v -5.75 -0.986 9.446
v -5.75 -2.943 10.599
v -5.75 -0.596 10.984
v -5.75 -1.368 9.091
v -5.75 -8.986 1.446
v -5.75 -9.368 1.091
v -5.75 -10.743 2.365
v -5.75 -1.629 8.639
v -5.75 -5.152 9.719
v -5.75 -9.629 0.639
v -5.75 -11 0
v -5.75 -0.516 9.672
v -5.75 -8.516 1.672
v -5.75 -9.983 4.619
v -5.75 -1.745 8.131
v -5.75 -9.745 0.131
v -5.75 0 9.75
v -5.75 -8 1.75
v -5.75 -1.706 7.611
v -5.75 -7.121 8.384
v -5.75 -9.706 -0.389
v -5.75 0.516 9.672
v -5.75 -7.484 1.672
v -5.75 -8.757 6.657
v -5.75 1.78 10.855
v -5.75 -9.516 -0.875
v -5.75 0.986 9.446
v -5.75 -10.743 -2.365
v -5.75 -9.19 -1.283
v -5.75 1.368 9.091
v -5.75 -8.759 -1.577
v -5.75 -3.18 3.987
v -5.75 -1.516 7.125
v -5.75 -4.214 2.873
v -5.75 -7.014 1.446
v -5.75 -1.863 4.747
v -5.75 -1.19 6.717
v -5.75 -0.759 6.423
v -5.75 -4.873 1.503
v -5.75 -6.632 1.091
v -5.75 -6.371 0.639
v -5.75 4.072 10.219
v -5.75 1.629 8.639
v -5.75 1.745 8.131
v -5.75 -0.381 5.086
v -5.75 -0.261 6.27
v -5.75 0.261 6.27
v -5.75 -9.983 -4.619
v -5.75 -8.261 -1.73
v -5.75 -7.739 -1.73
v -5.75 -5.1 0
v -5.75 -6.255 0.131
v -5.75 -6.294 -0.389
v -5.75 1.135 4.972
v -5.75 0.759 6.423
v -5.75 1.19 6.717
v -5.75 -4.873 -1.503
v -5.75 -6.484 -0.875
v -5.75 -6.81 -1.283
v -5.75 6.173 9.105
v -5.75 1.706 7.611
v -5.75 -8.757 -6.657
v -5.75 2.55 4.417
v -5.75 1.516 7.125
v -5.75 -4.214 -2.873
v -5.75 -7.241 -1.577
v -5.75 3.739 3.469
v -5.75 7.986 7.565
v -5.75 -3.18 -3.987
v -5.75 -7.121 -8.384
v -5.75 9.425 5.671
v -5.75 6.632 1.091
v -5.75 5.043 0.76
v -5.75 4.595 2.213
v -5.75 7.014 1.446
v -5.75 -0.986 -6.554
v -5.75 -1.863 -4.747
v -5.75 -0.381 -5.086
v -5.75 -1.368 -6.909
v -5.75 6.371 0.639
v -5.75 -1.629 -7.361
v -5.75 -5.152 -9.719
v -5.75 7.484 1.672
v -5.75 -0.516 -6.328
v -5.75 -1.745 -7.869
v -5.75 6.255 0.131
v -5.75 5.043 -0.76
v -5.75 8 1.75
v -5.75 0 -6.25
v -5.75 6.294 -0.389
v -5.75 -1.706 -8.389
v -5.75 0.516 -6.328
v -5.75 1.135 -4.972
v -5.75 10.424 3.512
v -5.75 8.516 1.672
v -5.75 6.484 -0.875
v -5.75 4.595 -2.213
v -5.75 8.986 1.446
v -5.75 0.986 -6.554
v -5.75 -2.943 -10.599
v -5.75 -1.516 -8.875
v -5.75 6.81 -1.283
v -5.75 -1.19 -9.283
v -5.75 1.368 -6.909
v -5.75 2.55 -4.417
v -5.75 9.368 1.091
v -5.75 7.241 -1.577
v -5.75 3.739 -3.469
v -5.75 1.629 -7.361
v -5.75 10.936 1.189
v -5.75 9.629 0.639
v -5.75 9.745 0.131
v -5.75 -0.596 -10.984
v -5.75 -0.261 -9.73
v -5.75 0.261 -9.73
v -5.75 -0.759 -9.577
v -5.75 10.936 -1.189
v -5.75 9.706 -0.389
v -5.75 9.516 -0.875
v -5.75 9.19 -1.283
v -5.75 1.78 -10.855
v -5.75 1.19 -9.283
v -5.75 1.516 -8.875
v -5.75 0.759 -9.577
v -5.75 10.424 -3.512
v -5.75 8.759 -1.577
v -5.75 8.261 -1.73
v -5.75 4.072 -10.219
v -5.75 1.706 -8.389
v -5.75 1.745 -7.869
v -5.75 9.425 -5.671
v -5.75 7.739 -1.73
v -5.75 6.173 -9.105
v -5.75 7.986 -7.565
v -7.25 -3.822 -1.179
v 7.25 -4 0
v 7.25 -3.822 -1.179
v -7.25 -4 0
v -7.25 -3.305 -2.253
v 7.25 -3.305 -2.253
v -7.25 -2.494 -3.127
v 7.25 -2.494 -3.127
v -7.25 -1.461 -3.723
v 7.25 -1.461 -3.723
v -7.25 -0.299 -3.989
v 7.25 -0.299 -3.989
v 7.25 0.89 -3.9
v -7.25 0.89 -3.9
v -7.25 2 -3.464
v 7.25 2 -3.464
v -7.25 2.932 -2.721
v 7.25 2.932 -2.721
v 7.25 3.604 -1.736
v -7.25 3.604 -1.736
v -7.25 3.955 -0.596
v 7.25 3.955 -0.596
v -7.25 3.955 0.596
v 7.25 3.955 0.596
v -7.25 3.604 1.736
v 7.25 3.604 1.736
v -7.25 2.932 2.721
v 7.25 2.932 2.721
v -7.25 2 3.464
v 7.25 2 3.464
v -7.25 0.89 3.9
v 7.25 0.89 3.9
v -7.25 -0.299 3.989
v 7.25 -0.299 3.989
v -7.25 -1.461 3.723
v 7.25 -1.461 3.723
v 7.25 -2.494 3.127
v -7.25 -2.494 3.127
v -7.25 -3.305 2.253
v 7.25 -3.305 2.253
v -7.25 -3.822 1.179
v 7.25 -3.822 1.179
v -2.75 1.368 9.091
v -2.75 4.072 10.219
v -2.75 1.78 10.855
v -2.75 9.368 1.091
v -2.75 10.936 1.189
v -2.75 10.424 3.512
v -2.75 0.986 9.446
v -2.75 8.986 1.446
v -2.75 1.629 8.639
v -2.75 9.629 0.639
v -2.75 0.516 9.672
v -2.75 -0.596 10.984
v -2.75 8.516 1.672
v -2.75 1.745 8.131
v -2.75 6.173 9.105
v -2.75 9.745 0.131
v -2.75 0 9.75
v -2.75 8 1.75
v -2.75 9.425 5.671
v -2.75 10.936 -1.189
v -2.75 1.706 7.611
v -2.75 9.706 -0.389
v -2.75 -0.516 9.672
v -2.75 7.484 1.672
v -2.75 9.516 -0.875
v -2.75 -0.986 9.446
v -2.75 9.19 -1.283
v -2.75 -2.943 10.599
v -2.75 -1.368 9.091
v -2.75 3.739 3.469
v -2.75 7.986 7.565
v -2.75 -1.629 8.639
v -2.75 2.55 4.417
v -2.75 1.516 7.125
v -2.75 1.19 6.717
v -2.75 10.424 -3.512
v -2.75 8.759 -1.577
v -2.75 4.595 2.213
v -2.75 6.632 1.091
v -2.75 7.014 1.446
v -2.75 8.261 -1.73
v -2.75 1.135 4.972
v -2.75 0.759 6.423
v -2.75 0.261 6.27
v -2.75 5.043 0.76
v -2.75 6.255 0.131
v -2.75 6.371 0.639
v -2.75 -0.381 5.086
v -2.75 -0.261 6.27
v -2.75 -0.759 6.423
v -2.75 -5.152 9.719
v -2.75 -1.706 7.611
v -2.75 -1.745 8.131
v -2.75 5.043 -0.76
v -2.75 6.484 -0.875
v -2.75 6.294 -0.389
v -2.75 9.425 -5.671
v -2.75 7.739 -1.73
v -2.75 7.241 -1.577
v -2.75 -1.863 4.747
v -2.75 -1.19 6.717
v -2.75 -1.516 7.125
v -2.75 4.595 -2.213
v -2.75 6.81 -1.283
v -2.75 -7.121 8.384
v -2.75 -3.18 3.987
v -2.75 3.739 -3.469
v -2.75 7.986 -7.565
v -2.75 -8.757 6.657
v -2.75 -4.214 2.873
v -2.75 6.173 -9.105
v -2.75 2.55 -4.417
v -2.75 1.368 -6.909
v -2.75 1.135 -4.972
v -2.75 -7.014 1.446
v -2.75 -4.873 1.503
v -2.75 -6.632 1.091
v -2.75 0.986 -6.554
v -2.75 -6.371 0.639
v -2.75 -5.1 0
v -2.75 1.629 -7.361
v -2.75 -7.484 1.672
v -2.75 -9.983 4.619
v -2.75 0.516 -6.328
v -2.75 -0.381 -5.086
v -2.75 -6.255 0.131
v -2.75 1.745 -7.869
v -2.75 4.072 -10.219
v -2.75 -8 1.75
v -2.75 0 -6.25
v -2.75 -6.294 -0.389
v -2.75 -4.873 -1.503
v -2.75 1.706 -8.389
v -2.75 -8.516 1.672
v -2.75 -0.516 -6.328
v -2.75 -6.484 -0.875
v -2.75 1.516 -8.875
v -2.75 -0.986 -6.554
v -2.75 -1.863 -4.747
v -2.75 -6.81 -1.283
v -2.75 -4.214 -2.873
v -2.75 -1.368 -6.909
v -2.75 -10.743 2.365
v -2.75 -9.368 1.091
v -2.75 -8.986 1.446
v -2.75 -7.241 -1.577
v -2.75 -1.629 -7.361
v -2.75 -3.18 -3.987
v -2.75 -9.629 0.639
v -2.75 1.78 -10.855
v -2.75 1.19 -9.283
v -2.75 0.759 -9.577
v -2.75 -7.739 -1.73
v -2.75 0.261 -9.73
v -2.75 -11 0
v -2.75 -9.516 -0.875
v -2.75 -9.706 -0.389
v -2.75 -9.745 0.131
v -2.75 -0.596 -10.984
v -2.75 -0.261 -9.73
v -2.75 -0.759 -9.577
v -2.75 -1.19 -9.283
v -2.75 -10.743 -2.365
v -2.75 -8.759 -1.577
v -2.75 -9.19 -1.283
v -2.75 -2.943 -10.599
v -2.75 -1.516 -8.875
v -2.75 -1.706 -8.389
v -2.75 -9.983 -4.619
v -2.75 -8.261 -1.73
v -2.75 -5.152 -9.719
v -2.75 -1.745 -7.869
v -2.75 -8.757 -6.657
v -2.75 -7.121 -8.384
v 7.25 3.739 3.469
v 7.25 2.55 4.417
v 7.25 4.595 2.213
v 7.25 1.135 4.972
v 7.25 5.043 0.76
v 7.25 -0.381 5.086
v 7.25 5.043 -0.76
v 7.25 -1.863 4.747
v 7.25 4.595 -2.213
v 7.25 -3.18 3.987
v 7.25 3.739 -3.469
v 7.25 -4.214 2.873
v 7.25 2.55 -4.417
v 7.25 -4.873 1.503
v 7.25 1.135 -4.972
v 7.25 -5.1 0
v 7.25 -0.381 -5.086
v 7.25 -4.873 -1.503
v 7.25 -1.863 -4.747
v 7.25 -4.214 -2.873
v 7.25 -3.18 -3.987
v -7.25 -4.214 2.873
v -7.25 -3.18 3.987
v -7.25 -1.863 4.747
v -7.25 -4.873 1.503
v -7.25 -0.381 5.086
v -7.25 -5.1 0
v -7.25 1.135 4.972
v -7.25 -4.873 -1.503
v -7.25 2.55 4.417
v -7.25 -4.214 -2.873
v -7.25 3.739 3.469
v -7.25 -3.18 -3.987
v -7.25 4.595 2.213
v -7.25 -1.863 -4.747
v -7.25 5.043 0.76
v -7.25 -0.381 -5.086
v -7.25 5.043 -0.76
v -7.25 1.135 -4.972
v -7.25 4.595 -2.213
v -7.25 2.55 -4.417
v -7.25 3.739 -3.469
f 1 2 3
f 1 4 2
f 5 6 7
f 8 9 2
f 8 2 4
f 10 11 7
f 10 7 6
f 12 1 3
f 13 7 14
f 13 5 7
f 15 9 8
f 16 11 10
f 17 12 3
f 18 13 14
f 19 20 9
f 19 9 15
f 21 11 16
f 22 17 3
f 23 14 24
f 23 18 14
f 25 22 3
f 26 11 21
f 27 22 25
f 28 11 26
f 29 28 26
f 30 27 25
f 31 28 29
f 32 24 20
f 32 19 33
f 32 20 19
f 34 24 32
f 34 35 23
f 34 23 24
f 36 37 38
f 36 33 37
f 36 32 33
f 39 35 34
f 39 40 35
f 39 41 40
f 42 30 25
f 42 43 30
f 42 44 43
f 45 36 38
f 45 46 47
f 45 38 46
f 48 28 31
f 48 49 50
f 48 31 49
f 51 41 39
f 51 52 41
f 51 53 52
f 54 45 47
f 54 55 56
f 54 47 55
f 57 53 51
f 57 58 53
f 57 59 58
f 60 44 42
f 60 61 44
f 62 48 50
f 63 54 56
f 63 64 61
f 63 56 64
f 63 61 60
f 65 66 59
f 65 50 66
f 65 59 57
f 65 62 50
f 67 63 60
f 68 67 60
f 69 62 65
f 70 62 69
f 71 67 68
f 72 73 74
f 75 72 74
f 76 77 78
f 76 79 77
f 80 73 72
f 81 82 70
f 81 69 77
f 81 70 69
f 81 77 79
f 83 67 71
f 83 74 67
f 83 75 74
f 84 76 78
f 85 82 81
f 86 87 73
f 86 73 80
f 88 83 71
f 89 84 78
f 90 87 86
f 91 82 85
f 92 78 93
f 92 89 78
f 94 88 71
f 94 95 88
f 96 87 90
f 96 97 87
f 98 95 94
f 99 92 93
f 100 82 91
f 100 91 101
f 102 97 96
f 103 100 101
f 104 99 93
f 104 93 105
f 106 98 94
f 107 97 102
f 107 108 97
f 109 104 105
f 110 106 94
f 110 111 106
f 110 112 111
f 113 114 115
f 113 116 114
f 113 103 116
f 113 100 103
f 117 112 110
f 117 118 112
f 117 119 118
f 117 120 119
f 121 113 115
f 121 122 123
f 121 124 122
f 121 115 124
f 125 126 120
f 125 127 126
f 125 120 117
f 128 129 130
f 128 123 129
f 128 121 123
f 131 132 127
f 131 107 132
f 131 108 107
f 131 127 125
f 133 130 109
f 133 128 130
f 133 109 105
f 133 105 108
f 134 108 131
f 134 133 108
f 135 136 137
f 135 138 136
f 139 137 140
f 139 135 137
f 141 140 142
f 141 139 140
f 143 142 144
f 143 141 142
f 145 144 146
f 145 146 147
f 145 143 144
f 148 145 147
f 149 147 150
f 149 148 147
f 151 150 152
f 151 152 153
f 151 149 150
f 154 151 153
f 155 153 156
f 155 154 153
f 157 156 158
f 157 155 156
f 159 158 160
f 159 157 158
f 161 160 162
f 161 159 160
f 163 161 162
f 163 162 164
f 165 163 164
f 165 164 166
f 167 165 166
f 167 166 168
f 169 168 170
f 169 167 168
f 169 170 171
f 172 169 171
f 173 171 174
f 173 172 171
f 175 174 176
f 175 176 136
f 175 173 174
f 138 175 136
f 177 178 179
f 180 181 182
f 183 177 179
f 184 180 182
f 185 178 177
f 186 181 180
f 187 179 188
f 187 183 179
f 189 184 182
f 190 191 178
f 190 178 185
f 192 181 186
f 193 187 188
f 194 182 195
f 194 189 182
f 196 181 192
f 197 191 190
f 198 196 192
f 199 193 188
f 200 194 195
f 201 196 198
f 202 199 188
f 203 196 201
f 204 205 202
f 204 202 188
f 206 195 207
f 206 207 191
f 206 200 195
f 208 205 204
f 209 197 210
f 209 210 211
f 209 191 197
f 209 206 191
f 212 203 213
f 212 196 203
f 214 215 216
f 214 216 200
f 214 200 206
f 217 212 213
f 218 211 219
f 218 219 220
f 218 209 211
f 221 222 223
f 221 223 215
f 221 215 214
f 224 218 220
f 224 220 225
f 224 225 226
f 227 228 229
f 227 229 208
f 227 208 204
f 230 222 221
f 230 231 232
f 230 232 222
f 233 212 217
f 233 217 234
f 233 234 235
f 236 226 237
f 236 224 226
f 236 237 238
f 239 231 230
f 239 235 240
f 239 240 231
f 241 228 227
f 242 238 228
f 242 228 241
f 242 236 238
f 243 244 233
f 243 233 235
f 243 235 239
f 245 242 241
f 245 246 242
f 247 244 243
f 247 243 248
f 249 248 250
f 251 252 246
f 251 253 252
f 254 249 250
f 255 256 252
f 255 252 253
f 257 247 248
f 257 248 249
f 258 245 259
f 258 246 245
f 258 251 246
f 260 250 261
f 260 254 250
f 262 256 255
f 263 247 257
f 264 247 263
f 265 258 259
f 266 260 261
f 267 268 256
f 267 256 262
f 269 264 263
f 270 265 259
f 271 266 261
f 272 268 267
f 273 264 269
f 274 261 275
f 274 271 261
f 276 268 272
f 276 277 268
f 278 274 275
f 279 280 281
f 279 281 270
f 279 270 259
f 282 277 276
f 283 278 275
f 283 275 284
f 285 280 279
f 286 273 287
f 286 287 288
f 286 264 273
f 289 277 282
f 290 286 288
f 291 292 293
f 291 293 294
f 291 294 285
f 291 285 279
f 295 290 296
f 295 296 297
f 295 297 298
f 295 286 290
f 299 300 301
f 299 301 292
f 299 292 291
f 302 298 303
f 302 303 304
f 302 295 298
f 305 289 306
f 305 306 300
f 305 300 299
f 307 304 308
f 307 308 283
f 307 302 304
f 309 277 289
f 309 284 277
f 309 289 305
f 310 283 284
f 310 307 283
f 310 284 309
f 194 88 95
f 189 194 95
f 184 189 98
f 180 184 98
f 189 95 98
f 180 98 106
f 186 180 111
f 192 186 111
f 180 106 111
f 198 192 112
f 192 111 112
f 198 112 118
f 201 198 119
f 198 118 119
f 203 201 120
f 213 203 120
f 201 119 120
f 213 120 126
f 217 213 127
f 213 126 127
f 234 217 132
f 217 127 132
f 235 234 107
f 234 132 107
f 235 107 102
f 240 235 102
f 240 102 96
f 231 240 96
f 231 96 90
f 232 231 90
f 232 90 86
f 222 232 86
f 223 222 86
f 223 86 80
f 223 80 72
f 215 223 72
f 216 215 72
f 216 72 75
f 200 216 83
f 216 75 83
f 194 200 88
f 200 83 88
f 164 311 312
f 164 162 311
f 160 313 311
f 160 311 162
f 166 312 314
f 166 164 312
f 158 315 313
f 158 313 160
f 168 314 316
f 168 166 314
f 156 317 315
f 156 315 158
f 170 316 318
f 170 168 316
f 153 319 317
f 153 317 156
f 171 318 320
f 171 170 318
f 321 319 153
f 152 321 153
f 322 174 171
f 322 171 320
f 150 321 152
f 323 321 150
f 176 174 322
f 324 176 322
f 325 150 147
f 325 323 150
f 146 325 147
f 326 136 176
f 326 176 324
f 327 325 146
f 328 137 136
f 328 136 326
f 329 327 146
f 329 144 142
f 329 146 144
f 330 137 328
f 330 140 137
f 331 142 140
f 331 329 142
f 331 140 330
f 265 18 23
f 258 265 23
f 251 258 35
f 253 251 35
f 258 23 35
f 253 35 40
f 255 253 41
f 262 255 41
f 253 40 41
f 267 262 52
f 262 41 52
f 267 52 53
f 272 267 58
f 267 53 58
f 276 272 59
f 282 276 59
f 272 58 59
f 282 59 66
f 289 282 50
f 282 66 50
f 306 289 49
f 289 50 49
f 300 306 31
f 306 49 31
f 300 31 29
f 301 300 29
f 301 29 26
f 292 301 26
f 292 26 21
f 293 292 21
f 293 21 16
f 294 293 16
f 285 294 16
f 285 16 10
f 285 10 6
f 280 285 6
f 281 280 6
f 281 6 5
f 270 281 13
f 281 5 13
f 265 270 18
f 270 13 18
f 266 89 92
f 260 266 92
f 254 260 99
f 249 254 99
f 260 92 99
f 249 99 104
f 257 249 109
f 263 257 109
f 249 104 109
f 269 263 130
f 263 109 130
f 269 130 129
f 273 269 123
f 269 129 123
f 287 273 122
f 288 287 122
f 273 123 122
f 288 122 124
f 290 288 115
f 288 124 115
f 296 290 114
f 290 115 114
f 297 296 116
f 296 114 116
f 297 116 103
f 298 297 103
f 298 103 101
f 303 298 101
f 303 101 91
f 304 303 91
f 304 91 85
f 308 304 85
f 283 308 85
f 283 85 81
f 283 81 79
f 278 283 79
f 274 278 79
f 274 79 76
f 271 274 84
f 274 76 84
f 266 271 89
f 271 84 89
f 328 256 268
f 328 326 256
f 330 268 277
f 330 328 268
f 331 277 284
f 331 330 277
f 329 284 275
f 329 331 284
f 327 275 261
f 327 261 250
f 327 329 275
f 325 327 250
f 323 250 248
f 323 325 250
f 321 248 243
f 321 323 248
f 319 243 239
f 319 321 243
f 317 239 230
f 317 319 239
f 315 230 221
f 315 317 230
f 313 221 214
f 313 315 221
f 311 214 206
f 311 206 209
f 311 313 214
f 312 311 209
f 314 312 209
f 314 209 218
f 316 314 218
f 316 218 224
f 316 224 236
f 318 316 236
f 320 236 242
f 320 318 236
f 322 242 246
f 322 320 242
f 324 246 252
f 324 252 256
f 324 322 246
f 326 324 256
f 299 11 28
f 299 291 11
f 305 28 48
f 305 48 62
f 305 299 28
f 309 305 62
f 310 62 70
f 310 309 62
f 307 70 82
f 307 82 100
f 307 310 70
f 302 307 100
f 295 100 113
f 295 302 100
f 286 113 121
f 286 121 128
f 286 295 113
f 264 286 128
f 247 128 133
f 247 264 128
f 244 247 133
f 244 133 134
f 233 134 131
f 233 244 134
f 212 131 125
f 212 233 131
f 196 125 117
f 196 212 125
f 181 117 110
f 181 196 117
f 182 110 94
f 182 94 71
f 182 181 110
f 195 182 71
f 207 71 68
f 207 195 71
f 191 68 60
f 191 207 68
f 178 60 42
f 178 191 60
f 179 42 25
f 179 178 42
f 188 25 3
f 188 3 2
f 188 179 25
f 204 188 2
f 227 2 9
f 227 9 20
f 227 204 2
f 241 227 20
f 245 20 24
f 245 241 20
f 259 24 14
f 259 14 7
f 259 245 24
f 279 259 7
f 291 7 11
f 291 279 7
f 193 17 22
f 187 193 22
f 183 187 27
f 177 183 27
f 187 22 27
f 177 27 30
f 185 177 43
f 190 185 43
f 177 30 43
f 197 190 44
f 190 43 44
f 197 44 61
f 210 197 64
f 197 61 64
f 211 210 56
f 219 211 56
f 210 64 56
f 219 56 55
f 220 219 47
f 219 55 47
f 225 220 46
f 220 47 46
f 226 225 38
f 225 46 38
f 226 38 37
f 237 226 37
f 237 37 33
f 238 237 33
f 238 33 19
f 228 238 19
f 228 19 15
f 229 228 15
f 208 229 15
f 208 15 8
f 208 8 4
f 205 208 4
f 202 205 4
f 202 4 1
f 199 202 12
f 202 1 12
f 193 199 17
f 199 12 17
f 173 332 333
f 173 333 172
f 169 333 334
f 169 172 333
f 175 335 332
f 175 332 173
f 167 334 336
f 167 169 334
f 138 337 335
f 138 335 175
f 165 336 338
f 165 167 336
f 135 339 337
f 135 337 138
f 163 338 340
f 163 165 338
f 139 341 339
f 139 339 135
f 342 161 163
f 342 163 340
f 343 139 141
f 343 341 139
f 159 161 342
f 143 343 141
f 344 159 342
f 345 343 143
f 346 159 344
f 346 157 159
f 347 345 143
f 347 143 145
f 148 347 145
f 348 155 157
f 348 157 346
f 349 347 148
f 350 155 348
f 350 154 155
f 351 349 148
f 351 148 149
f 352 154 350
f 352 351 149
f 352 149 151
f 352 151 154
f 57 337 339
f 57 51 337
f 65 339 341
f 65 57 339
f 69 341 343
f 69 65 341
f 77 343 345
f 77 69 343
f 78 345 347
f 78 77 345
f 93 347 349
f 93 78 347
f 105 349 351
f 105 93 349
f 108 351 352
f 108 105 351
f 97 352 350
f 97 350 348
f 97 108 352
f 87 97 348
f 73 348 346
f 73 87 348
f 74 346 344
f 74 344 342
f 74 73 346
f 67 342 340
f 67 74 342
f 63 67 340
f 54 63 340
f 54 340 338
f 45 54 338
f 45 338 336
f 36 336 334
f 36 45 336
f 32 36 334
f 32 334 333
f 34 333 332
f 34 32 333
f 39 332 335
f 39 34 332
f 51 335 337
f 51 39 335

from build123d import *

# Parameters (mm, degrees)
SKETCH3_R          = 1.75
CUT_EXTRUDE2_DEPTH = 3


with BuildPart() as part:
    # Sketch1 → Revolve1 (revolve)
    with BuildSketch(Plane.XY):
        Polygon((-5.75, -5.1), (-5.75, -11), (-2.75, -11), (-2.75, -5.1), (7.25, -5.1), (7.25, -4), (-7.25, -4), (-7.25, -5.1), align=None)
    revolve(axis=Axis((-7.25, 0, 0), (1, 0, 0)))

    # Sketch3 → Cut-Extrude2 (cut)
    with BuildSketch(Plane.ZY.offset(5.75)):
        with Locations((0, 8)):
            Circle(SKETCH3_R)
        with Locations((0, -8)):
            Circle(SKETCH3_R)
        with Locations((8, 0)):
            Circle(SKETCH3_R)
        with Locations((-8, 0)):
            Circle(SKETCH3_R)
        Polygon((5205.178442712, 2346.745629148), (5205.178442712, 2340.845629148), (5208.178442712, 2340.845629148), (5208.178442712, 2346.745629148), (5218.178442712, 2346.745629148), (5218.178442712, 2347.845629148), (5203.678442712, 2347.845629148), (5203.678442712, 2346.745629148), align=None)
    extrude(amount=-CUT_EXTRUDE2_DEPTH, mode=Mode.SUBTRACT)


solid = part.part
